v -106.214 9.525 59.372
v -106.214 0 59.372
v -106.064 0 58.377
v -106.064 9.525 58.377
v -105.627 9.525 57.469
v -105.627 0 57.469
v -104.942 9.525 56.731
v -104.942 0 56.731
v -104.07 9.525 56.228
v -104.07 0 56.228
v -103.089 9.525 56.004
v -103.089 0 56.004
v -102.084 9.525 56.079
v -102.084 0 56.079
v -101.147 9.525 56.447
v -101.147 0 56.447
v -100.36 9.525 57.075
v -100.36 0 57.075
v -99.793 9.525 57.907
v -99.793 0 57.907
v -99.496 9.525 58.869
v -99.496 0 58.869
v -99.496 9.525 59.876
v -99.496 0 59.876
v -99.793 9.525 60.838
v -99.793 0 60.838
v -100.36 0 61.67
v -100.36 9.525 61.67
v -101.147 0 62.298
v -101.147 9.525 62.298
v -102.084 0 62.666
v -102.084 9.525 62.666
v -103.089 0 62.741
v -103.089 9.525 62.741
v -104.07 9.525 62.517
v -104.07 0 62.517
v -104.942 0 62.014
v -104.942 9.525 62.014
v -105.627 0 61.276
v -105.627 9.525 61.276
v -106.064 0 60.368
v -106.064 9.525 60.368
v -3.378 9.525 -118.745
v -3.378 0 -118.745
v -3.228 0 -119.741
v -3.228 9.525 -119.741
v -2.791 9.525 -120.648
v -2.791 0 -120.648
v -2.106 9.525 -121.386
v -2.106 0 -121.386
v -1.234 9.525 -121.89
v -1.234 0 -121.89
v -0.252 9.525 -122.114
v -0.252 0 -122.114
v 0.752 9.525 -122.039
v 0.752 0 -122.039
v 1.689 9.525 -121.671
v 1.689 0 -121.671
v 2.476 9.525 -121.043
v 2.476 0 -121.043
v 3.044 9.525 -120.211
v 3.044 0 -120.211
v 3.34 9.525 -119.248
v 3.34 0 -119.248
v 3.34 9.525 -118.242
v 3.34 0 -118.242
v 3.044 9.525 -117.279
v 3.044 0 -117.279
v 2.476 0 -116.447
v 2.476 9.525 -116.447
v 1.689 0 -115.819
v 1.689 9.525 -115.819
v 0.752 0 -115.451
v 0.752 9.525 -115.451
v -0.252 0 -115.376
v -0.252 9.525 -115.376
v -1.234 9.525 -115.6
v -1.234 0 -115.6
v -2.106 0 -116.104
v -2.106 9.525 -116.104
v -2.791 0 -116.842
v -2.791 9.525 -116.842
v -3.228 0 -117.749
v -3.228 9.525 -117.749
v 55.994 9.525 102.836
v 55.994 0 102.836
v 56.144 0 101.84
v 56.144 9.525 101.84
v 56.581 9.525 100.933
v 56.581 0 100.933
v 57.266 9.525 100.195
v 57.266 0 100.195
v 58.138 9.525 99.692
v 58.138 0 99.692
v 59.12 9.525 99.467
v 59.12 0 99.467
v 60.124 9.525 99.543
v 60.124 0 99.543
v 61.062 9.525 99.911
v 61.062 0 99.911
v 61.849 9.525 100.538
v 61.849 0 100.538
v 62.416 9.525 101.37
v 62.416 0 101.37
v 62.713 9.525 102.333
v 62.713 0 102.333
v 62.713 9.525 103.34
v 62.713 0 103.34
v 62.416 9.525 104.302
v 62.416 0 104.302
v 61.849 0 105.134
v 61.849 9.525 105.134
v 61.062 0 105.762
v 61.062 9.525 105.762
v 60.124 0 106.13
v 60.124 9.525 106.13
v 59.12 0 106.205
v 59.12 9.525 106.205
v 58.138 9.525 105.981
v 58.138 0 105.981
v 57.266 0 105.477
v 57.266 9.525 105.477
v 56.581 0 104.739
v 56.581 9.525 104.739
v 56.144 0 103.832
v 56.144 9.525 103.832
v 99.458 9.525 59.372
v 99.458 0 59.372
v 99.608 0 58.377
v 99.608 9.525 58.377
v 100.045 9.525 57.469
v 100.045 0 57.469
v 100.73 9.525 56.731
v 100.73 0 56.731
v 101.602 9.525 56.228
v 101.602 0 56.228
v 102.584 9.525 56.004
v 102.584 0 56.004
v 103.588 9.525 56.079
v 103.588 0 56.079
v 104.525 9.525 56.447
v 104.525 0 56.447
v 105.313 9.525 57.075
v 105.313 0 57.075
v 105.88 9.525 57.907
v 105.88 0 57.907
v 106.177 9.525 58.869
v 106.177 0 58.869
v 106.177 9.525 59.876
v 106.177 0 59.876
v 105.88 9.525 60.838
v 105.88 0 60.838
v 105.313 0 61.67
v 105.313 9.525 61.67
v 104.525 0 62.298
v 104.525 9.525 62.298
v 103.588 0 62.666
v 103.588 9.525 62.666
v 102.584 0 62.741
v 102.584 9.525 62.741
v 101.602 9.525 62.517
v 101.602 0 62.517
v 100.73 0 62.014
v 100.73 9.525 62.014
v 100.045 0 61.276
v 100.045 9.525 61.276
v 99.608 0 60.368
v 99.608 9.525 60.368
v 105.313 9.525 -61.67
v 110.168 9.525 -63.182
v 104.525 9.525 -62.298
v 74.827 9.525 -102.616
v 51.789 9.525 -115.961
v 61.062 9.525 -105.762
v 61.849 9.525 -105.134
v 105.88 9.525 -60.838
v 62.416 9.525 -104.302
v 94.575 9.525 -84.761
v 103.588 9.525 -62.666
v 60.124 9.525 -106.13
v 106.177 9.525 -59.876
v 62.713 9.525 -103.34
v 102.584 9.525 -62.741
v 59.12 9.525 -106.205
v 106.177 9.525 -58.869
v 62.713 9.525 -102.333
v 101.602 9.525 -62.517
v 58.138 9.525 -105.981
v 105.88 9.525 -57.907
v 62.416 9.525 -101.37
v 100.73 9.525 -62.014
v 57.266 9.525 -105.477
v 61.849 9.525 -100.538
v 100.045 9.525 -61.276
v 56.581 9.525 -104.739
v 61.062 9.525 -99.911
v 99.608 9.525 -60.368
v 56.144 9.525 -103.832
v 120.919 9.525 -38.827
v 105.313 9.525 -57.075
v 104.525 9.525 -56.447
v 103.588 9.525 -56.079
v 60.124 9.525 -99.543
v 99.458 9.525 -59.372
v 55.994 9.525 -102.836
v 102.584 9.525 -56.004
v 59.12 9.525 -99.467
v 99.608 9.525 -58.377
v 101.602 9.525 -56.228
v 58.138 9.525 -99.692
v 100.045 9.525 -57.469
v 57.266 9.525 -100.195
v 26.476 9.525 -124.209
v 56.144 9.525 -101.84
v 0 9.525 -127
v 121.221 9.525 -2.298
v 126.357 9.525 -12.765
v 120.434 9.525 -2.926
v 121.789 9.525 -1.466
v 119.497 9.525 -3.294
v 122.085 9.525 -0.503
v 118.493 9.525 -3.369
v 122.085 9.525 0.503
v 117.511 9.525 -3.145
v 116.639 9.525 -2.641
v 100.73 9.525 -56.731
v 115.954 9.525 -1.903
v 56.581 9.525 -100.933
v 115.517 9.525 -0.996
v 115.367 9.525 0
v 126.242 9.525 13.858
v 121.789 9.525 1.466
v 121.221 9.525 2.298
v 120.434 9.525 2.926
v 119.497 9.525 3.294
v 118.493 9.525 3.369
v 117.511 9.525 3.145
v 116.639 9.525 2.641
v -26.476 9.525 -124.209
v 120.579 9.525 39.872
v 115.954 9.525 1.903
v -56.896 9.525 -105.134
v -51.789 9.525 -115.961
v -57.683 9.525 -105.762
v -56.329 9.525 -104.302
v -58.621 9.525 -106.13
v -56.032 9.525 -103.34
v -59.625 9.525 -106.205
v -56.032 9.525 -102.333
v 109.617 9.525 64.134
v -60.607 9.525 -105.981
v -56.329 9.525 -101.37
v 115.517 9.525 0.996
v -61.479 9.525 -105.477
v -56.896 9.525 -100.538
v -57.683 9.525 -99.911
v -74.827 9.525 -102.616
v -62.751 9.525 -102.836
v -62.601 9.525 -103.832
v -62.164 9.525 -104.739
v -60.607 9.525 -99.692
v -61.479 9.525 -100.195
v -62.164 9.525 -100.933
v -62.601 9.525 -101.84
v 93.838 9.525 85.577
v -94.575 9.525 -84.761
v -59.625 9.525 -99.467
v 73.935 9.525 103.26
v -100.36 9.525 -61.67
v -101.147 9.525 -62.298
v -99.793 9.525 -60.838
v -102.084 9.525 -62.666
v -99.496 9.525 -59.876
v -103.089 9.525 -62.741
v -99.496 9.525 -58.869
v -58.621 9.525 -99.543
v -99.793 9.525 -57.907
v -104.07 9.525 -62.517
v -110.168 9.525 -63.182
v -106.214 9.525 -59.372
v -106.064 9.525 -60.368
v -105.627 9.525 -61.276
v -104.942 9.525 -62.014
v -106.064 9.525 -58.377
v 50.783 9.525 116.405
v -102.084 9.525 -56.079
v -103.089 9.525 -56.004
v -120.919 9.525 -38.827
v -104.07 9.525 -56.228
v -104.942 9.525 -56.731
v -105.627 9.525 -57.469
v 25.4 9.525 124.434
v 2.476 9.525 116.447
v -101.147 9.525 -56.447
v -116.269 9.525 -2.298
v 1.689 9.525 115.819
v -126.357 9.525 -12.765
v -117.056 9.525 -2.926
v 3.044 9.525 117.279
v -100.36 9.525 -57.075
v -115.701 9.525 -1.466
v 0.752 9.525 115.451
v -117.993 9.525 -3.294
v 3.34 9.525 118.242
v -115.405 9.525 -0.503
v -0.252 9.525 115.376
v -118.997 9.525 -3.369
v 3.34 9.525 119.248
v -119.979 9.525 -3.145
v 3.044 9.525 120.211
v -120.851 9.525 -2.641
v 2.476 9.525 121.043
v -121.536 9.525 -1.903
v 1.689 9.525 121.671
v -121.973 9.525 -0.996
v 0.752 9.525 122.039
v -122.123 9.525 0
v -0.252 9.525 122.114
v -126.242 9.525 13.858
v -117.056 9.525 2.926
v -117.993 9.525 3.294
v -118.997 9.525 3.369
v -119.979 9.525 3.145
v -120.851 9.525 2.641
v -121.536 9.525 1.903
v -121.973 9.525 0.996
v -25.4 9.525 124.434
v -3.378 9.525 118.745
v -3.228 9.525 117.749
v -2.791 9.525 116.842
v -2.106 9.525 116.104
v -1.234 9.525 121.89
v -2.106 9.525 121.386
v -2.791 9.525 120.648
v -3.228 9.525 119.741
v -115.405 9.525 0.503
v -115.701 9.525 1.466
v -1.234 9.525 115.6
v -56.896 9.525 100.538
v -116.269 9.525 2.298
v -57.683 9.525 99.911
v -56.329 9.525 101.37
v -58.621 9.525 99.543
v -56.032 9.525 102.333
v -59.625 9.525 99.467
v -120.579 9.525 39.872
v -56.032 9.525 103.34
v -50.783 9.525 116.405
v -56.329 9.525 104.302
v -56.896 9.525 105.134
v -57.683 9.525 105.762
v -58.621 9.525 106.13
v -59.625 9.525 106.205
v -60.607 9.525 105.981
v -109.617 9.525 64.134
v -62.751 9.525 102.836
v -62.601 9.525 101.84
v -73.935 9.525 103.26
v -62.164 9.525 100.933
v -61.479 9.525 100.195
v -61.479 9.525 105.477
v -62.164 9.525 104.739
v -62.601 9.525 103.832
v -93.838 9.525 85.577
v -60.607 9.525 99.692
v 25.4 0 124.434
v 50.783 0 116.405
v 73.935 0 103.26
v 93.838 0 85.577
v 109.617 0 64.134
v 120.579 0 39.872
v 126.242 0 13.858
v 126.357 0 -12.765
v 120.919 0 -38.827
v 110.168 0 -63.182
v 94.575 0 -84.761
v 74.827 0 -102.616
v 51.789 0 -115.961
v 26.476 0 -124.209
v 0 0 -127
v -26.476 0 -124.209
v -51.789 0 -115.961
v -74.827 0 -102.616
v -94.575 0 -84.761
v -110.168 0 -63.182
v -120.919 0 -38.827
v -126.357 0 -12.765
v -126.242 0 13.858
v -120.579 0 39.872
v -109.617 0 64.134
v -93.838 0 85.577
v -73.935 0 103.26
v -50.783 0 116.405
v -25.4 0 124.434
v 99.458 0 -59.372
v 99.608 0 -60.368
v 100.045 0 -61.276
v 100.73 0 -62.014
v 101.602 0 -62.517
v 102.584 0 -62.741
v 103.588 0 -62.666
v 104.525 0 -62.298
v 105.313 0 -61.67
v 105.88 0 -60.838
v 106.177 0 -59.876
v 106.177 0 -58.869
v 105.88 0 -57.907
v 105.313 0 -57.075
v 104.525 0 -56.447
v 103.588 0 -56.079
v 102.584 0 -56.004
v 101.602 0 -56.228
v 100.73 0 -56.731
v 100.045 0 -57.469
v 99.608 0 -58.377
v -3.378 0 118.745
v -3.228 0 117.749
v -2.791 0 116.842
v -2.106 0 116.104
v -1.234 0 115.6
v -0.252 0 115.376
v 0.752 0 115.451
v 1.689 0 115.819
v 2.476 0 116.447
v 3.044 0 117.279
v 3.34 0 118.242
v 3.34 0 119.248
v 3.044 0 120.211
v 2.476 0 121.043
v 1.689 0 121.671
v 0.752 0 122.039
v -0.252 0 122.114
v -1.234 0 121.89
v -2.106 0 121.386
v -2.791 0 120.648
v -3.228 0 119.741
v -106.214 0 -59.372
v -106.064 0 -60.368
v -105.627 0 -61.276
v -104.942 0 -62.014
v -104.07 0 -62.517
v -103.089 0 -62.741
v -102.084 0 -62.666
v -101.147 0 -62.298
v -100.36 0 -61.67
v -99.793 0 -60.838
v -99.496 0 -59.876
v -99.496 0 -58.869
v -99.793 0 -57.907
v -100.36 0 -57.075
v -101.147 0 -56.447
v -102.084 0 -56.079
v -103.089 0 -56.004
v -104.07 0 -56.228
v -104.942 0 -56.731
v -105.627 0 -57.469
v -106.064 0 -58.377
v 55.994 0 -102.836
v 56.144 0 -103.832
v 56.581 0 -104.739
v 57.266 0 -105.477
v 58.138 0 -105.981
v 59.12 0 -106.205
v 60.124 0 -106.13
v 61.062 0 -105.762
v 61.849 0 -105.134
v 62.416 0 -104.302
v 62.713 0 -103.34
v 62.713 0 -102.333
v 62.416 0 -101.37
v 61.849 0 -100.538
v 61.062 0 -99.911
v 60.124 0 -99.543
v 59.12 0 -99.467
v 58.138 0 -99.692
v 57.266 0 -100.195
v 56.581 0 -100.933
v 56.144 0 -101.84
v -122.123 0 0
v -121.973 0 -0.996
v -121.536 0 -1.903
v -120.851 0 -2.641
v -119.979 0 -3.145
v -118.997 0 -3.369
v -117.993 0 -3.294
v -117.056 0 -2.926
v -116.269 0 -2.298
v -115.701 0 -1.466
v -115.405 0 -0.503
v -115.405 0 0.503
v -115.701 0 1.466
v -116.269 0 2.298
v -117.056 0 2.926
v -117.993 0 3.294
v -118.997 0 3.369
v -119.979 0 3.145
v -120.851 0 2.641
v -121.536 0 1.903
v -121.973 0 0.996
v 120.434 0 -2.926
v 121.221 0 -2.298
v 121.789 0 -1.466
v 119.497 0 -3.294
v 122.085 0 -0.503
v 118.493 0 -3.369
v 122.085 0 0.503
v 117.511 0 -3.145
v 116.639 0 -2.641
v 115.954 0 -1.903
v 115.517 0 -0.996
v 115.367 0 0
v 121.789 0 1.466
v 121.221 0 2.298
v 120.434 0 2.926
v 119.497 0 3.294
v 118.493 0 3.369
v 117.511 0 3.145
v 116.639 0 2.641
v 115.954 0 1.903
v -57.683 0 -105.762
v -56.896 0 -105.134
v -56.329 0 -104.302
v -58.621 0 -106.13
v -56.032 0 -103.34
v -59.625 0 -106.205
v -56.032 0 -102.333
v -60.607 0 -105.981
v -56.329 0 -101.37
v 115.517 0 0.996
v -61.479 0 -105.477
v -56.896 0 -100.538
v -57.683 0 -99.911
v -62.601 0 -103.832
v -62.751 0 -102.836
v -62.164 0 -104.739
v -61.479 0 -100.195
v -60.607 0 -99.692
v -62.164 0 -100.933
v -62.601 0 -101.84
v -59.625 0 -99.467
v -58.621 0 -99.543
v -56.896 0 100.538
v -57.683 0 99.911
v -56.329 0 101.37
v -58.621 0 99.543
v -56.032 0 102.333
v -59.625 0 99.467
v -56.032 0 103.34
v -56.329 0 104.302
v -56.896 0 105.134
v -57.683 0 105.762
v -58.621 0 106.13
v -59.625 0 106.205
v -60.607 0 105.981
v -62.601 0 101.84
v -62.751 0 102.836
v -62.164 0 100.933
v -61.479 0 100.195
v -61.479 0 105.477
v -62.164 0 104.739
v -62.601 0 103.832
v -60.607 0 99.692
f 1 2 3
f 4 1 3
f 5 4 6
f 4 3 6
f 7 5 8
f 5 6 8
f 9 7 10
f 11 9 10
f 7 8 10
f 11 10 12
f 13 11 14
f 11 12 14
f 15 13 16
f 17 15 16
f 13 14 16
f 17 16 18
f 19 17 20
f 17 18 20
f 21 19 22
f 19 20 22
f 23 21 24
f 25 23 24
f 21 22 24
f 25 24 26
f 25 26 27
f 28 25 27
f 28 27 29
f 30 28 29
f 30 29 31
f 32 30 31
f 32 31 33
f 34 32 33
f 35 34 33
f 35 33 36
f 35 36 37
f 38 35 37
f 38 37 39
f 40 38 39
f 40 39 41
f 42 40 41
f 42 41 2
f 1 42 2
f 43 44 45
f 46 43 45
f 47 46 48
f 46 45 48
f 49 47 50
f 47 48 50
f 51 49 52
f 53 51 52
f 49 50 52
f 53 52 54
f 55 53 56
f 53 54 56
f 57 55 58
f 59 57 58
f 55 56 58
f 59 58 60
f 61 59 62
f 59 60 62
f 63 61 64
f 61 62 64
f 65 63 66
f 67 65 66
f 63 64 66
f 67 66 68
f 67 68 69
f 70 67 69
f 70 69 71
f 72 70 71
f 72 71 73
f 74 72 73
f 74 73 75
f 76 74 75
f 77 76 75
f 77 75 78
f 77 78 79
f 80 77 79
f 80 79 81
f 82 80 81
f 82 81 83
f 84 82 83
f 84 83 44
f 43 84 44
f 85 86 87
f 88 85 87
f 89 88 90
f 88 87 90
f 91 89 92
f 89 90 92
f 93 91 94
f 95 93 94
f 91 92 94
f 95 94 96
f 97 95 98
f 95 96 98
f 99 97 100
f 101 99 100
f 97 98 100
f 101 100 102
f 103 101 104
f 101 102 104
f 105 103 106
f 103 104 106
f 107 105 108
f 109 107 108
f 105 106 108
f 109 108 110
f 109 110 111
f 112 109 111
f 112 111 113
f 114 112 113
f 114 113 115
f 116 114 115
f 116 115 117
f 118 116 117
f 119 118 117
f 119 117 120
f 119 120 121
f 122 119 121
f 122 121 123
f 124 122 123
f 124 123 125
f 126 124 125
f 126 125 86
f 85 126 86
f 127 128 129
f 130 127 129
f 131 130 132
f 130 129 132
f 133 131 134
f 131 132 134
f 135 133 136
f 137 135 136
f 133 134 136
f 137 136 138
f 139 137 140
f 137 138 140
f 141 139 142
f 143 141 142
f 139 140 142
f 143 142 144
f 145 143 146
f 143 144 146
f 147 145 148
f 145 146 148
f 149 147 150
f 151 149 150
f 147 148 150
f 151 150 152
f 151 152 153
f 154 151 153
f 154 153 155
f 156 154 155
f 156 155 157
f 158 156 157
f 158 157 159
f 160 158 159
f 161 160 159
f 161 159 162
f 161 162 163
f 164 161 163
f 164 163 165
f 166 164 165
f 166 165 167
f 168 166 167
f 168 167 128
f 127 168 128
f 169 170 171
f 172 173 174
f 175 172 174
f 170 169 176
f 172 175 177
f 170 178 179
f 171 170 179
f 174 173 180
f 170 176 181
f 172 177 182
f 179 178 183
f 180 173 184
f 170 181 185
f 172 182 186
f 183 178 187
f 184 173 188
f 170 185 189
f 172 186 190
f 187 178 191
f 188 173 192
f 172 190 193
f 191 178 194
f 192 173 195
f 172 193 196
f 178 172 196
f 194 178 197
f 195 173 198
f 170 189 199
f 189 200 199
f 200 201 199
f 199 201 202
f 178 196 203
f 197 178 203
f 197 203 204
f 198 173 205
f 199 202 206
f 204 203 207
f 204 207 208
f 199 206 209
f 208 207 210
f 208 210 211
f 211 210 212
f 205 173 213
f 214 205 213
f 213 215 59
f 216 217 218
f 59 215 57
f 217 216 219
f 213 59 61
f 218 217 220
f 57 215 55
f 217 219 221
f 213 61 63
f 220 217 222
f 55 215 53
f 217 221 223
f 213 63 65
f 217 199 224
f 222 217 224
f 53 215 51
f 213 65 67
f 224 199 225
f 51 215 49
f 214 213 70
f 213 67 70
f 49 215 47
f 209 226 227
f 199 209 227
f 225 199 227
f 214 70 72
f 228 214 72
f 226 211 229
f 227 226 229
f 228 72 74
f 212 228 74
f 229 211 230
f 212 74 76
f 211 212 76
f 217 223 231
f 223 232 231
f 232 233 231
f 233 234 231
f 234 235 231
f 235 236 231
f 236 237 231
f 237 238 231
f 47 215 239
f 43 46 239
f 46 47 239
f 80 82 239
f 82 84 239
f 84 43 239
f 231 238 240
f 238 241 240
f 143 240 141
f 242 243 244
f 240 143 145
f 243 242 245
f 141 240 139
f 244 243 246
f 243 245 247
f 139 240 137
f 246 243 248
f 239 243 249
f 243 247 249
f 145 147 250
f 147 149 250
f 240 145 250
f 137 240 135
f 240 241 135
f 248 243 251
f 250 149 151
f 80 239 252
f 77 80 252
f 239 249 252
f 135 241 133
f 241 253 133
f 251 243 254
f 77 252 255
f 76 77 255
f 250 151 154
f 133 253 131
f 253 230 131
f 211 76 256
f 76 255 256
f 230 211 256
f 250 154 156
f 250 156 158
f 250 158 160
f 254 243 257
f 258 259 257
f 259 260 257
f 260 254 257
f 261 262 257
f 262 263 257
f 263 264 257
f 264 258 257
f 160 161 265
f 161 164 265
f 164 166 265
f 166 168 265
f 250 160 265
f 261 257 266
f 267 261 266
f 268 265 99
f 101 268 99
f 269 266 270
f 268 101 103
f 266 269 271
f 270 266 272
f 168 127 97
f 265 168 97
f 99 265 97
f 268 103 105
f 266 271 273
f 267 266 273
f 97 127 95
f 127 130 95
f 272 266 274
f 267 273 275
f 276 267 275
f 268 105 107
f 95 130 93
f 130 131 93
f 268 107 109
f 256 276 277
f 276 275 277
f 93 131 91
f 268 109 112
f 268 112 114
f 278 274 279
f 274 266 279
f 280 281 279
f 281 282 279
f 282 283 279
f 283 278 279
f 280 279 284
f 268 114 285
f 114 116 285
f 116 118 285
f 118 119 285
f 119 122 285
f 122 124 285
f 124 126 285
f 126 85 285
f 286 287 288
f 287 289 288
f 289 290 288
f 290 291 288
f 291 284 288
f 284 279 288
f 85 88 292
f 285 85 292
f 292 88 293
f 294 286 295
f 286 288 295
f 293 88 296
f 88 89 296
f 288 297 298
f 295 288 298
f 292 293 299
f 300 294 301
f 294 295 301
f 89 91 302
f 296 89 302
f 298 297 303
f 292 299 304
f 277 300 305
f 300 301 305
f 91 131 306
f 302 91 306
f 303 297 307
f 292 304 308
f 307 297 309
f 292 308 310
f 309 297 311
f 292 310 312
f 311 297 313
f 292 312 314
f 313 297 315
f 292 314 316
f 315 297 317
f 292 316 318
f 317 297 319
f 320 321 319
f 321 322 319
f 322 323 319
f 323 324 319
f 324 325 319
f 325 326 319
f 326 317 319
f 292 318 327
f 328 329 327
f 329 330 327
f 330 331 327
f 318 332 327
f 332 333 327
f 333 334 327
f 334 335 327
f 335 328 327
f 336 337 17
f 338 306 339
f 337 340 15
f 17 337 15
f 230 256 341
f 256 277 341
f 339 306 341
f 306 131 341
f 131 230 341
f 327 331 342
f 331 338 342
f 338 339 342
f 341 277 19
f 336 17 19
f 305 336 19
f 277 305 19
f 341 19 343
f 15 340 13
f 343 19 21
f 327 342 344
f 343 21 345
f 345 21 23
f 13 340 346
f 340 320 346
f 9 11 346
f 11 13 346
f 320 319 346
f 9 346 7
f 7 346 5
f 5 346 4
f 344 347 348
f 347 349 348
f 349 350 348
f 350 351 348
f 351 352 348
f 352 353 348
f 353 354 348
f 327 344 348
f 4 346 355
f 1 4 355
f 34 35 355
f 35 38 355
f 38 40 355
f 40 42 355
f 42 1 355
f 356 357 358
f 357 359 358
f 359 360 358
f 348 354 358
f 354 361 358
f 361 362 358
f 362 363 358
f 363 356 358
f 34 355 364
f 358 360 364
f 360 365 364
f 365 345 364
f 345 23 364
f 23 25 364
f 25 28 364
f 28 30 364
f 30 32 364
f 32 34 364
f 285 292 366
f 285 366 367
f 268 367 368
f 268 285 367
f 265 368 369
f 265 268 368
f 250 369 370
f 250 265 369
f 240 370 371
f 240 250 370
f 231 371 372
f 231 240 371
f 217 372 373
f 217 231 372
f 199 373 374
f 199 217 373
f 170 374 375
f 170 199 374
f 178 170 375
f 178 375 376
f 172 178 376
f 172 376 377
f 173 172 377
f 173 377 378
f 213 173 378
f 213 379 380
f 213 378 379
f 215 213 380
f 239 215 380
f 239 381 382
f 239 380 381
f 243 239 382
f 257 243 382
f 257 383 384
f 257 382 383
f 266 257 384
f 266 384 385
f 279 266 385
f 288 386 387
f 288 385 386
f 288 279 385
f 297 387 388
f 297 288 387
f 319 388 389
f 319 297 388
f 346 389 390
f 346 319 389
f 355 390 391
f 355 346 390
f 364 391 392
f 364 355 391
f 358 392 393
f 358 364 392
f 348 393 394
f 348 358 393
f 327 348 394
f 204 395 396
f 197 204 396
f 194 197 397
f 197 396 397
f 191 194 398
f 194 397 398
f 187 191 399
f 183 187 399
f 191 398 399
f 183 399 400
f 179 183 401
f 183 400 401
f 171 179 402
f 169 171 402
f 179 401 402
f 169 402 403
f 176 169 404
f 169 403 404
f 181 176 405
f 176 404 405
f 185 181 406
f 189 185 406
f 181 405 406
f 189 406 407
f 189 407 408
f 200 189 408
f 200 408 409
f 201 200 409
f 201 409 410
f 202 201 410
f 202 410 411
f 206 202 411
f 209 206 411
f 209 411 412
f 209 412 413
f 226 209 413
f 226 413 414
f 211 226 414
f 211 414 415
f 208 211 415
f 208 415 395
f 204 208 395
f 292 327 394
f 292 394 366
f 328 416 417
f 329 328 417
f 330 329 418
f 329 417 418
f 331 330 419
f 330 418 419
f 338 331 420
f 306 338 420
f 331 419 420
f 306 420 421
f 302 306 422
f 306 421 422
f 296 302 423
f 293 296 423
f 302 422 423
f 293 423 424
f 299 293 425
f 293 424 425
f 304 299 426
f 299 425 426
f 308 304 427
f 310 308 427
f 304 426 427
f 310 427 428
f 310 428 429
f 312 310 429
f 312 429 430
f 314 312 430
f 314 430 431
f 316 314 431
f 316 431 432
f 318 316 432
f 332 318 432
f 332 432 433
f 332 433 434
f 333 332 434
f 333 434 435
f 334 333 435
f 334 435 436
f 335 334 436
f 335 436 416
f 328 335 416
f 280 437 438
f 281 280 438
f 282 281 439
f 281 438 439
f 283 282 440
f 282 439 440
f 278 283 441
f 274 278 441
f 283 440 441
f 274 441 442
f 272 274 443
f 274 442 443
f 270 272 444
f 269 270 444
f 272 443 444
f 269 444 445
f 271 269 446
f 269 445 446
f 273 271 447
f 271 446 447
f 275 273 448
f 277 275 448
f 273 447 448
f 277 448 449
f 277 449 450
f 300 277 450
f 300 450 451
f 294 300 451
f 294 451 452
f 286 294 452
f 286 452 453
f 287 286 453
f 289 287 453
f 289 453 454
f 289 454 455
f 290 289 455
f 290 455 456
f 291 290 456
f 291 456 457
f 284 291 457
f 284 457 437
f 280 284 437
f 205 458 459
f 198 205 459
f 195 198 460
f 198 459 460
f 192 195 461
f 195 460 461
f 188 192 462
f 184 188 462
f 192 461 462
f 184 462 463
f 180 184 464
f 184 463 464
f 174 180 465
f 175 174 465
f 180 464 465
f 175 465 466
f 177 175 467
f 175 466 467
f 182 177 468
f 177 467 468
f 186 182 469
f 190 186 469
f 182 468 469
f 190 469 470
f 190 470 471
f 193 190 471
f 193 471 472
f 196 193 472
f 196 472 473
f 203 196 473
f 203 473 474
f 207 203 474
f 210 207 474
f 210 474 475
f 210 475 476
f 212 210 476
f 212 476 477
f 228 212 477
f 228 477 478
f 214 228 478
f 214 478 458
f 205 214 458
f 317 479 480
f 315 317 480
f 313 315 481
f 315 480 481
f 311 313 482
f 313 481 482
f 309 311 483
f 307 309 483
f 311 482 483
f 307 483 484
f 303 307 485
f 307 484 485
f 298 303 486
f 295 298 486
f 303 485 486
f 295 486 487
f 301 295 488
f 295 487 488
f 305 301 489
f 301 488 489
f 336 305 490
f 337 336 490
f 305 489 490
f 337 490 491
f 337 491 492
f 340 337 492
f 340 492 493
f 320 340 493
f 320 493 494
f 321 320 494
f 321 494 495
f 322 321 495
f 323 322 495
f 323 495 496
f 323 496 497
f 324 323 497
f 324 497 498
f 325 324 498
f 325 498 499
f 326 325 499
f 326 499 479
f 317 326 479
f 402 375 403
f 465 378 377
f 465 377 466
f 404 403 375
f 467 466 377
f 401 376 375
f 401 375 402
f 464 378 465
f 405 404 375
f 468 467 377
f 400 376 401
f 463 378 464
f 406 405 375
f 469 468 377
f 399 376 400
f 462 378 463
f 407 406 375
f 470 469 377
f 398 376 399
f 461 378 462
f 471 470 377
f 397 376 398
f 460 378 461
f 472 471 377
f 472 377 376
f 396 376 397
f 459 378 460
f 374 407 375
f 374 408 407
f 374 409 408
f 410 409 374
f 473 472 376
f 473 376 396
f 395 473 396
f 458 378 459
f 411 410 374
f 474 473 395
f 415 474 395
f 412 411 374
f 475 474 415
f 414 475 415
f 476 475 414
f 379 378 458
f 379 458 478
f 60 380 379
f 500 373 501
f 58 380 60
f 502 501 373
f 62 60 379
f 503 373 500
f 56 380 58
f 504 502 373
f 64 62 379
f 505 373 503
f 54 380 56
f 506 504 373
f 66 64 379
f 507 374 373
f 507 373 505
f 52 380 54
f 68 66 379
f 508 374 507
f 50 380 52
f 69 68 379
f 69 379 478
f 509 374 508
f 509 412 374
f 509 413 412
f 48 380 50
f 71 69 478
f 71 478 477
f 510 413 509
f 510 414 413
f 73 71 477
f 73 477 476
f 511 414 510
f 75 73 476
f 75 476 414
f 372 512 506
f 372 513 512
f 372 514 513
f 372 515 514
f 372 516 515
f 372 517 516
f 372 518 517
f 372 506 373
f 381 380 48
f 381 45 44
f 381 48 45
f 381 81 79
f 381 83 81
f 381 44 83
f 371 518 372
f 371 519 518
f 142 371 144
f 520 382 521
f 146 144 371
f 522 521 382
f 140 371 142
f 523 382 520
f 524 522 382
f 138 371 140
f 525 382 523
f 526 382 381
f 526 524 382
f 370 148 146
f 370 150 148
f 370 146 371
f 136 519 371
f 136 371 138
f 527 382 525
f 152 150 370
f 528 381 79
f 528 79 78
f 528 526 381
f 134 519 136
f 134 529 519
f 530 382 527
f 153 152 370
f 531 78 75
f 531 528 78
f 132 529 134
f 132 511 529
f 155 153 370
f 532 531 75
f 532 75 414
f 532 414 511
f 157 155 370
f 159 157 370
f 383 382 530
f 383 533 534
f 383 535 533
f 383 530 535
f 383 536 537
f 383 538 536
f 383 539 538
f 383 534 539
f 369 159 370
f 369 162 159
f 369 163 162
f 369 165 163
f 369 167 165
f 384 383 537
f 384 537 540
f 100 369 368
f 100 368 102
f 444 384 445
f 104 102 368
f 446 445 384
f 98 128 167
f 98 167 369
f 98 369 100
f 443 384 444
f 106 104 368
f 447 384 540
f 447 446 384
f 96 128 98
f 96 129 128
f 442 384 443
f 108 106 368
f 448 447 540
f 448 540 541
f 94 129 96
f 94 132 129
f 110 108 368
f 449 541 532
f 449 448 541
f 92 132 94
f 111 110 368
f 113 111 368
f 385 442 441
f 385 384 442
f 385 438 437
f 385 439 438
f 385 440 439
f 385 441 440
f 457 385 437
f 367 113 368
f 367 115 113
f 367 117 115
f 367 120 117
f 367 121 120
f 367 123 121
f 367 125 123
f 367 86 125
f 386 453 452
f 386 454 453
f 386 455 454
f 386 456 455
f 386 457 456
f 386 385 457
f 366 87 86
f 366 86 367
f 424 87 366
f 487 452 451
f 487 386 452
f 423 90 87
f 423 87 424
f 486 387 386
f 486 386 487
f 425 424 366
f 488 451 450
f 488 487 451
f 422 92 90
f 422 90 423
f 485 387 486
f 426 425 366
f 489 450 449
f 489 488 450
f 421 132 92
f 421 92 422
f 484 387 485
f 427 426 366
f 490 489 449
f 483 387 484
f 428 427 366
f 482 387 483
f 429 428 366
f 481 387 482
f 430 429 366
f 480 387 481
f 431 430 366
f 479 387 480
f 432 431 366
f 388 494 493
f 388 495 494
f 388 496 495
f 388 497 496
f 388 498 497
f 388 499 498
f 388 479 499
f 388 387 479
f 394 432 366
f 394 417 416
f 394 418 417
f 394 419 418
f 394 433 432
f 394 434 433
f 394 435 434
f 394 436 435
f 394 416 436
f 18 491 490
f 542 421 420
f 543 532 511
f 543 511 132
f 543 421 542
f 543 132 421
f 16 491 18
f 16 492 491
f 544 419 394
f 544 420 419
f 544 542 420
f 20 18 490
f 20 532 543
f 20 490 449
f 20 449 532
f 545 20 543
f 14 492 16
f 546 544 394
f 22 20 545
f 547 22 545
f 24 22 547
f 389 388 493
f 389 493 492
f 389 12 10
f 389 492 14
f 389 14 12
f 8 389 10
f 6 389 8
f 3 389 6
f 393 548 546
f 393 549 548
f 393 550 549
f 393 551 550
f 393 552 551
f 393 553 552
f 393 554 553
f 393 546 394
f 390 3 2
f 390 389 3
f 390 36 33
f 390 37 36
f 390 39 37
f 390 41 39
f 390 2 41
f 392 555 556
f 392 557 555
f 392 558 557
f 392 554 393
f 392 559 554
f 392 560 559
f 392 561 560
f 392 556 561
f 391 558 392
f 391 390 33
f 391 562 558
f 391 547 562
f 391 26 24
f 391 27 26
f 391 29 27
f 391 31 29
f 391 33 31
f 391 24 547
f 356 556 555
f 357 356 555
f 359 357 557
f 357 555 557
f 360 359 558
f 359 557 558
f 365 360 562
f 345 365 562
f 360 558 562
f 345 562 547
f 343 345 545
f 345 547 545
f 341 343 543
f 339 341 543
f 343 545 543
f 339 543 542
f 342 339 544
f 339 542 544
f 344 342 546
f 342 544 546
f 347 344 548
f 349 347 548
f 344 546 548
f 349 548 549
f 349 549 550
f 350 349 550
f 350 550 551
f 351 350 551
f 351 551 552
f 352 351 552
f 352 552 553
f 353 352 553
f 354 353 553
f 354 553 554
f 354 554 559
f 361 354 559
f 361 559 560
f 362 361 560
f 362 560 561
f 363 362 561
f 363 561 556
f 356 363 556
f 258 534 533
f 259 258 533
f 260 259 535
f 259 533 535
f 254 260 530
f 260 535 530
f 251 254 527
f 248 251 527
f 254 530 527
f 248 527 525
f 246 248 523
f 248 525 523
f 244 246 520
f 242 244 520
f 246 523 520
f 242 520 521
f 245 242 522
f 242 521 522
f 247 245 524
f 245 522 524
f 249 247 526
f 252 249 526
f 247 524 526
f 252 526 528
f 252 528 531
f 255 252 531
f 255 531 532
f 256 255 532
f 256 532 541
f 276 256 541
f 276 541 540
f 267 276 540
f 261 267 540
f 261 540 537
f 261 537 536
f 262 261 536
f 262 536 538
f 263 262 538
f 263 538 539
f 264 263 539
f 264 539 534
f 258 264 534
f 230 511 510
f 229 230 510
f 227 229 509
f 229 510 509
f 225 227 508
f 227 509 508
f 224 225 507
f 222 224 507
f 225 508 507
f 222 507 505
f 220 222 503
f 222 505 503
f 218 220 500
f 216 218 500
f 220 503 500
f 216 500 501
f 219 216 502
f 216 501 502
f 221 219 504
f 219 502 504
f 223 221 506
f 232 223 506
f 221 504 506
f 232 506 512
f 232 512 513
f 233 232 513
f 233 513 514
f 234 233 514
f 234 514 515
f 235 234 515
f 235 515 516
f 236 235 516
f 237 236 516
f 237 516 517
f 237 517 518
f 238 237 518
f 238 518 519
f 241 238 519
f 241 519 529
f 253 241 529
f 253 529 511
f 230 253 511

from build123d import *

# Parameters (mm, degrees)
SKETCH1_W               = 127
SKETCH1_H               = 9.525
F_1_4_CLEARANCE_HOLE1_D = 6.7564
CUT_EXTRUDE1_REACH      = 181.858
SKETCH4_W               = 50.8
SKETCH4_H               = 2.565921067


with BuildPart() as part:
    # Sketch1 → Revolve1 (revolve)
    with BuildSketch(Plane.XY, mode=Mode.PRIVATE) as revolve1_sk:
        with Locations((63.5, 4.7625)):
            Rectangle(SKETCH1_W, SKETCH1_H)
    revolve(revolve1_sk.sketch.rotate(Axis((0, 0, 0), (0, 1, 0)), 90), axis=Axis((0, 0, 0), (0, 1, 0)))

    # 1/4 Clearance Hole1 (through all)
    with Locations(Plane(origin=(0, 9.525, 0), x_dir=(1, 0, 0), z_dir=(0, 1, 0))):
        with Locations((0, 118.745), (59.3725, 102.836186572), (102.836186572, 59.3725), (118.745, 0), (102.836186572, -59.3725), (59.3725, -102.836186572), (0, -118.745), (-59.3725, -102.836186572), (-102.836186572, -59.3725), (-118.745, 0), (-102.836186572, 59.3725), (-59.3725, 102.836186572)):
            Hole(F_1_4_CLEARANCE_HOLE1_D / 2)

    # Sketch4 → Cut-Extrude1 (cut, up to next)
    with BuildSketch(Plane(origin=(0, 9.525, 0), x_dir=(1, 0, 0), z_dir=(0, 1, 0)), mode=Mode.PRIVATE) as cut_extrude1_sk1:
        with Locations((0, -125.717039467)):
            Rectangle(SKETCH4_W, SKETCH4_H)
    cut_extrude1_tool1 = extrude(cut_extrude1_sk1.sketch, amount=-CUT_EXTRUDE1_REACH, mode=Mode.PRIVATE) & part.part
    add(cut_extrude1_tool1.solids().sort_by_distance((0, 9.525, 125.717039))[0], mode=Mode.SUBTRACT)


solid = part.part
